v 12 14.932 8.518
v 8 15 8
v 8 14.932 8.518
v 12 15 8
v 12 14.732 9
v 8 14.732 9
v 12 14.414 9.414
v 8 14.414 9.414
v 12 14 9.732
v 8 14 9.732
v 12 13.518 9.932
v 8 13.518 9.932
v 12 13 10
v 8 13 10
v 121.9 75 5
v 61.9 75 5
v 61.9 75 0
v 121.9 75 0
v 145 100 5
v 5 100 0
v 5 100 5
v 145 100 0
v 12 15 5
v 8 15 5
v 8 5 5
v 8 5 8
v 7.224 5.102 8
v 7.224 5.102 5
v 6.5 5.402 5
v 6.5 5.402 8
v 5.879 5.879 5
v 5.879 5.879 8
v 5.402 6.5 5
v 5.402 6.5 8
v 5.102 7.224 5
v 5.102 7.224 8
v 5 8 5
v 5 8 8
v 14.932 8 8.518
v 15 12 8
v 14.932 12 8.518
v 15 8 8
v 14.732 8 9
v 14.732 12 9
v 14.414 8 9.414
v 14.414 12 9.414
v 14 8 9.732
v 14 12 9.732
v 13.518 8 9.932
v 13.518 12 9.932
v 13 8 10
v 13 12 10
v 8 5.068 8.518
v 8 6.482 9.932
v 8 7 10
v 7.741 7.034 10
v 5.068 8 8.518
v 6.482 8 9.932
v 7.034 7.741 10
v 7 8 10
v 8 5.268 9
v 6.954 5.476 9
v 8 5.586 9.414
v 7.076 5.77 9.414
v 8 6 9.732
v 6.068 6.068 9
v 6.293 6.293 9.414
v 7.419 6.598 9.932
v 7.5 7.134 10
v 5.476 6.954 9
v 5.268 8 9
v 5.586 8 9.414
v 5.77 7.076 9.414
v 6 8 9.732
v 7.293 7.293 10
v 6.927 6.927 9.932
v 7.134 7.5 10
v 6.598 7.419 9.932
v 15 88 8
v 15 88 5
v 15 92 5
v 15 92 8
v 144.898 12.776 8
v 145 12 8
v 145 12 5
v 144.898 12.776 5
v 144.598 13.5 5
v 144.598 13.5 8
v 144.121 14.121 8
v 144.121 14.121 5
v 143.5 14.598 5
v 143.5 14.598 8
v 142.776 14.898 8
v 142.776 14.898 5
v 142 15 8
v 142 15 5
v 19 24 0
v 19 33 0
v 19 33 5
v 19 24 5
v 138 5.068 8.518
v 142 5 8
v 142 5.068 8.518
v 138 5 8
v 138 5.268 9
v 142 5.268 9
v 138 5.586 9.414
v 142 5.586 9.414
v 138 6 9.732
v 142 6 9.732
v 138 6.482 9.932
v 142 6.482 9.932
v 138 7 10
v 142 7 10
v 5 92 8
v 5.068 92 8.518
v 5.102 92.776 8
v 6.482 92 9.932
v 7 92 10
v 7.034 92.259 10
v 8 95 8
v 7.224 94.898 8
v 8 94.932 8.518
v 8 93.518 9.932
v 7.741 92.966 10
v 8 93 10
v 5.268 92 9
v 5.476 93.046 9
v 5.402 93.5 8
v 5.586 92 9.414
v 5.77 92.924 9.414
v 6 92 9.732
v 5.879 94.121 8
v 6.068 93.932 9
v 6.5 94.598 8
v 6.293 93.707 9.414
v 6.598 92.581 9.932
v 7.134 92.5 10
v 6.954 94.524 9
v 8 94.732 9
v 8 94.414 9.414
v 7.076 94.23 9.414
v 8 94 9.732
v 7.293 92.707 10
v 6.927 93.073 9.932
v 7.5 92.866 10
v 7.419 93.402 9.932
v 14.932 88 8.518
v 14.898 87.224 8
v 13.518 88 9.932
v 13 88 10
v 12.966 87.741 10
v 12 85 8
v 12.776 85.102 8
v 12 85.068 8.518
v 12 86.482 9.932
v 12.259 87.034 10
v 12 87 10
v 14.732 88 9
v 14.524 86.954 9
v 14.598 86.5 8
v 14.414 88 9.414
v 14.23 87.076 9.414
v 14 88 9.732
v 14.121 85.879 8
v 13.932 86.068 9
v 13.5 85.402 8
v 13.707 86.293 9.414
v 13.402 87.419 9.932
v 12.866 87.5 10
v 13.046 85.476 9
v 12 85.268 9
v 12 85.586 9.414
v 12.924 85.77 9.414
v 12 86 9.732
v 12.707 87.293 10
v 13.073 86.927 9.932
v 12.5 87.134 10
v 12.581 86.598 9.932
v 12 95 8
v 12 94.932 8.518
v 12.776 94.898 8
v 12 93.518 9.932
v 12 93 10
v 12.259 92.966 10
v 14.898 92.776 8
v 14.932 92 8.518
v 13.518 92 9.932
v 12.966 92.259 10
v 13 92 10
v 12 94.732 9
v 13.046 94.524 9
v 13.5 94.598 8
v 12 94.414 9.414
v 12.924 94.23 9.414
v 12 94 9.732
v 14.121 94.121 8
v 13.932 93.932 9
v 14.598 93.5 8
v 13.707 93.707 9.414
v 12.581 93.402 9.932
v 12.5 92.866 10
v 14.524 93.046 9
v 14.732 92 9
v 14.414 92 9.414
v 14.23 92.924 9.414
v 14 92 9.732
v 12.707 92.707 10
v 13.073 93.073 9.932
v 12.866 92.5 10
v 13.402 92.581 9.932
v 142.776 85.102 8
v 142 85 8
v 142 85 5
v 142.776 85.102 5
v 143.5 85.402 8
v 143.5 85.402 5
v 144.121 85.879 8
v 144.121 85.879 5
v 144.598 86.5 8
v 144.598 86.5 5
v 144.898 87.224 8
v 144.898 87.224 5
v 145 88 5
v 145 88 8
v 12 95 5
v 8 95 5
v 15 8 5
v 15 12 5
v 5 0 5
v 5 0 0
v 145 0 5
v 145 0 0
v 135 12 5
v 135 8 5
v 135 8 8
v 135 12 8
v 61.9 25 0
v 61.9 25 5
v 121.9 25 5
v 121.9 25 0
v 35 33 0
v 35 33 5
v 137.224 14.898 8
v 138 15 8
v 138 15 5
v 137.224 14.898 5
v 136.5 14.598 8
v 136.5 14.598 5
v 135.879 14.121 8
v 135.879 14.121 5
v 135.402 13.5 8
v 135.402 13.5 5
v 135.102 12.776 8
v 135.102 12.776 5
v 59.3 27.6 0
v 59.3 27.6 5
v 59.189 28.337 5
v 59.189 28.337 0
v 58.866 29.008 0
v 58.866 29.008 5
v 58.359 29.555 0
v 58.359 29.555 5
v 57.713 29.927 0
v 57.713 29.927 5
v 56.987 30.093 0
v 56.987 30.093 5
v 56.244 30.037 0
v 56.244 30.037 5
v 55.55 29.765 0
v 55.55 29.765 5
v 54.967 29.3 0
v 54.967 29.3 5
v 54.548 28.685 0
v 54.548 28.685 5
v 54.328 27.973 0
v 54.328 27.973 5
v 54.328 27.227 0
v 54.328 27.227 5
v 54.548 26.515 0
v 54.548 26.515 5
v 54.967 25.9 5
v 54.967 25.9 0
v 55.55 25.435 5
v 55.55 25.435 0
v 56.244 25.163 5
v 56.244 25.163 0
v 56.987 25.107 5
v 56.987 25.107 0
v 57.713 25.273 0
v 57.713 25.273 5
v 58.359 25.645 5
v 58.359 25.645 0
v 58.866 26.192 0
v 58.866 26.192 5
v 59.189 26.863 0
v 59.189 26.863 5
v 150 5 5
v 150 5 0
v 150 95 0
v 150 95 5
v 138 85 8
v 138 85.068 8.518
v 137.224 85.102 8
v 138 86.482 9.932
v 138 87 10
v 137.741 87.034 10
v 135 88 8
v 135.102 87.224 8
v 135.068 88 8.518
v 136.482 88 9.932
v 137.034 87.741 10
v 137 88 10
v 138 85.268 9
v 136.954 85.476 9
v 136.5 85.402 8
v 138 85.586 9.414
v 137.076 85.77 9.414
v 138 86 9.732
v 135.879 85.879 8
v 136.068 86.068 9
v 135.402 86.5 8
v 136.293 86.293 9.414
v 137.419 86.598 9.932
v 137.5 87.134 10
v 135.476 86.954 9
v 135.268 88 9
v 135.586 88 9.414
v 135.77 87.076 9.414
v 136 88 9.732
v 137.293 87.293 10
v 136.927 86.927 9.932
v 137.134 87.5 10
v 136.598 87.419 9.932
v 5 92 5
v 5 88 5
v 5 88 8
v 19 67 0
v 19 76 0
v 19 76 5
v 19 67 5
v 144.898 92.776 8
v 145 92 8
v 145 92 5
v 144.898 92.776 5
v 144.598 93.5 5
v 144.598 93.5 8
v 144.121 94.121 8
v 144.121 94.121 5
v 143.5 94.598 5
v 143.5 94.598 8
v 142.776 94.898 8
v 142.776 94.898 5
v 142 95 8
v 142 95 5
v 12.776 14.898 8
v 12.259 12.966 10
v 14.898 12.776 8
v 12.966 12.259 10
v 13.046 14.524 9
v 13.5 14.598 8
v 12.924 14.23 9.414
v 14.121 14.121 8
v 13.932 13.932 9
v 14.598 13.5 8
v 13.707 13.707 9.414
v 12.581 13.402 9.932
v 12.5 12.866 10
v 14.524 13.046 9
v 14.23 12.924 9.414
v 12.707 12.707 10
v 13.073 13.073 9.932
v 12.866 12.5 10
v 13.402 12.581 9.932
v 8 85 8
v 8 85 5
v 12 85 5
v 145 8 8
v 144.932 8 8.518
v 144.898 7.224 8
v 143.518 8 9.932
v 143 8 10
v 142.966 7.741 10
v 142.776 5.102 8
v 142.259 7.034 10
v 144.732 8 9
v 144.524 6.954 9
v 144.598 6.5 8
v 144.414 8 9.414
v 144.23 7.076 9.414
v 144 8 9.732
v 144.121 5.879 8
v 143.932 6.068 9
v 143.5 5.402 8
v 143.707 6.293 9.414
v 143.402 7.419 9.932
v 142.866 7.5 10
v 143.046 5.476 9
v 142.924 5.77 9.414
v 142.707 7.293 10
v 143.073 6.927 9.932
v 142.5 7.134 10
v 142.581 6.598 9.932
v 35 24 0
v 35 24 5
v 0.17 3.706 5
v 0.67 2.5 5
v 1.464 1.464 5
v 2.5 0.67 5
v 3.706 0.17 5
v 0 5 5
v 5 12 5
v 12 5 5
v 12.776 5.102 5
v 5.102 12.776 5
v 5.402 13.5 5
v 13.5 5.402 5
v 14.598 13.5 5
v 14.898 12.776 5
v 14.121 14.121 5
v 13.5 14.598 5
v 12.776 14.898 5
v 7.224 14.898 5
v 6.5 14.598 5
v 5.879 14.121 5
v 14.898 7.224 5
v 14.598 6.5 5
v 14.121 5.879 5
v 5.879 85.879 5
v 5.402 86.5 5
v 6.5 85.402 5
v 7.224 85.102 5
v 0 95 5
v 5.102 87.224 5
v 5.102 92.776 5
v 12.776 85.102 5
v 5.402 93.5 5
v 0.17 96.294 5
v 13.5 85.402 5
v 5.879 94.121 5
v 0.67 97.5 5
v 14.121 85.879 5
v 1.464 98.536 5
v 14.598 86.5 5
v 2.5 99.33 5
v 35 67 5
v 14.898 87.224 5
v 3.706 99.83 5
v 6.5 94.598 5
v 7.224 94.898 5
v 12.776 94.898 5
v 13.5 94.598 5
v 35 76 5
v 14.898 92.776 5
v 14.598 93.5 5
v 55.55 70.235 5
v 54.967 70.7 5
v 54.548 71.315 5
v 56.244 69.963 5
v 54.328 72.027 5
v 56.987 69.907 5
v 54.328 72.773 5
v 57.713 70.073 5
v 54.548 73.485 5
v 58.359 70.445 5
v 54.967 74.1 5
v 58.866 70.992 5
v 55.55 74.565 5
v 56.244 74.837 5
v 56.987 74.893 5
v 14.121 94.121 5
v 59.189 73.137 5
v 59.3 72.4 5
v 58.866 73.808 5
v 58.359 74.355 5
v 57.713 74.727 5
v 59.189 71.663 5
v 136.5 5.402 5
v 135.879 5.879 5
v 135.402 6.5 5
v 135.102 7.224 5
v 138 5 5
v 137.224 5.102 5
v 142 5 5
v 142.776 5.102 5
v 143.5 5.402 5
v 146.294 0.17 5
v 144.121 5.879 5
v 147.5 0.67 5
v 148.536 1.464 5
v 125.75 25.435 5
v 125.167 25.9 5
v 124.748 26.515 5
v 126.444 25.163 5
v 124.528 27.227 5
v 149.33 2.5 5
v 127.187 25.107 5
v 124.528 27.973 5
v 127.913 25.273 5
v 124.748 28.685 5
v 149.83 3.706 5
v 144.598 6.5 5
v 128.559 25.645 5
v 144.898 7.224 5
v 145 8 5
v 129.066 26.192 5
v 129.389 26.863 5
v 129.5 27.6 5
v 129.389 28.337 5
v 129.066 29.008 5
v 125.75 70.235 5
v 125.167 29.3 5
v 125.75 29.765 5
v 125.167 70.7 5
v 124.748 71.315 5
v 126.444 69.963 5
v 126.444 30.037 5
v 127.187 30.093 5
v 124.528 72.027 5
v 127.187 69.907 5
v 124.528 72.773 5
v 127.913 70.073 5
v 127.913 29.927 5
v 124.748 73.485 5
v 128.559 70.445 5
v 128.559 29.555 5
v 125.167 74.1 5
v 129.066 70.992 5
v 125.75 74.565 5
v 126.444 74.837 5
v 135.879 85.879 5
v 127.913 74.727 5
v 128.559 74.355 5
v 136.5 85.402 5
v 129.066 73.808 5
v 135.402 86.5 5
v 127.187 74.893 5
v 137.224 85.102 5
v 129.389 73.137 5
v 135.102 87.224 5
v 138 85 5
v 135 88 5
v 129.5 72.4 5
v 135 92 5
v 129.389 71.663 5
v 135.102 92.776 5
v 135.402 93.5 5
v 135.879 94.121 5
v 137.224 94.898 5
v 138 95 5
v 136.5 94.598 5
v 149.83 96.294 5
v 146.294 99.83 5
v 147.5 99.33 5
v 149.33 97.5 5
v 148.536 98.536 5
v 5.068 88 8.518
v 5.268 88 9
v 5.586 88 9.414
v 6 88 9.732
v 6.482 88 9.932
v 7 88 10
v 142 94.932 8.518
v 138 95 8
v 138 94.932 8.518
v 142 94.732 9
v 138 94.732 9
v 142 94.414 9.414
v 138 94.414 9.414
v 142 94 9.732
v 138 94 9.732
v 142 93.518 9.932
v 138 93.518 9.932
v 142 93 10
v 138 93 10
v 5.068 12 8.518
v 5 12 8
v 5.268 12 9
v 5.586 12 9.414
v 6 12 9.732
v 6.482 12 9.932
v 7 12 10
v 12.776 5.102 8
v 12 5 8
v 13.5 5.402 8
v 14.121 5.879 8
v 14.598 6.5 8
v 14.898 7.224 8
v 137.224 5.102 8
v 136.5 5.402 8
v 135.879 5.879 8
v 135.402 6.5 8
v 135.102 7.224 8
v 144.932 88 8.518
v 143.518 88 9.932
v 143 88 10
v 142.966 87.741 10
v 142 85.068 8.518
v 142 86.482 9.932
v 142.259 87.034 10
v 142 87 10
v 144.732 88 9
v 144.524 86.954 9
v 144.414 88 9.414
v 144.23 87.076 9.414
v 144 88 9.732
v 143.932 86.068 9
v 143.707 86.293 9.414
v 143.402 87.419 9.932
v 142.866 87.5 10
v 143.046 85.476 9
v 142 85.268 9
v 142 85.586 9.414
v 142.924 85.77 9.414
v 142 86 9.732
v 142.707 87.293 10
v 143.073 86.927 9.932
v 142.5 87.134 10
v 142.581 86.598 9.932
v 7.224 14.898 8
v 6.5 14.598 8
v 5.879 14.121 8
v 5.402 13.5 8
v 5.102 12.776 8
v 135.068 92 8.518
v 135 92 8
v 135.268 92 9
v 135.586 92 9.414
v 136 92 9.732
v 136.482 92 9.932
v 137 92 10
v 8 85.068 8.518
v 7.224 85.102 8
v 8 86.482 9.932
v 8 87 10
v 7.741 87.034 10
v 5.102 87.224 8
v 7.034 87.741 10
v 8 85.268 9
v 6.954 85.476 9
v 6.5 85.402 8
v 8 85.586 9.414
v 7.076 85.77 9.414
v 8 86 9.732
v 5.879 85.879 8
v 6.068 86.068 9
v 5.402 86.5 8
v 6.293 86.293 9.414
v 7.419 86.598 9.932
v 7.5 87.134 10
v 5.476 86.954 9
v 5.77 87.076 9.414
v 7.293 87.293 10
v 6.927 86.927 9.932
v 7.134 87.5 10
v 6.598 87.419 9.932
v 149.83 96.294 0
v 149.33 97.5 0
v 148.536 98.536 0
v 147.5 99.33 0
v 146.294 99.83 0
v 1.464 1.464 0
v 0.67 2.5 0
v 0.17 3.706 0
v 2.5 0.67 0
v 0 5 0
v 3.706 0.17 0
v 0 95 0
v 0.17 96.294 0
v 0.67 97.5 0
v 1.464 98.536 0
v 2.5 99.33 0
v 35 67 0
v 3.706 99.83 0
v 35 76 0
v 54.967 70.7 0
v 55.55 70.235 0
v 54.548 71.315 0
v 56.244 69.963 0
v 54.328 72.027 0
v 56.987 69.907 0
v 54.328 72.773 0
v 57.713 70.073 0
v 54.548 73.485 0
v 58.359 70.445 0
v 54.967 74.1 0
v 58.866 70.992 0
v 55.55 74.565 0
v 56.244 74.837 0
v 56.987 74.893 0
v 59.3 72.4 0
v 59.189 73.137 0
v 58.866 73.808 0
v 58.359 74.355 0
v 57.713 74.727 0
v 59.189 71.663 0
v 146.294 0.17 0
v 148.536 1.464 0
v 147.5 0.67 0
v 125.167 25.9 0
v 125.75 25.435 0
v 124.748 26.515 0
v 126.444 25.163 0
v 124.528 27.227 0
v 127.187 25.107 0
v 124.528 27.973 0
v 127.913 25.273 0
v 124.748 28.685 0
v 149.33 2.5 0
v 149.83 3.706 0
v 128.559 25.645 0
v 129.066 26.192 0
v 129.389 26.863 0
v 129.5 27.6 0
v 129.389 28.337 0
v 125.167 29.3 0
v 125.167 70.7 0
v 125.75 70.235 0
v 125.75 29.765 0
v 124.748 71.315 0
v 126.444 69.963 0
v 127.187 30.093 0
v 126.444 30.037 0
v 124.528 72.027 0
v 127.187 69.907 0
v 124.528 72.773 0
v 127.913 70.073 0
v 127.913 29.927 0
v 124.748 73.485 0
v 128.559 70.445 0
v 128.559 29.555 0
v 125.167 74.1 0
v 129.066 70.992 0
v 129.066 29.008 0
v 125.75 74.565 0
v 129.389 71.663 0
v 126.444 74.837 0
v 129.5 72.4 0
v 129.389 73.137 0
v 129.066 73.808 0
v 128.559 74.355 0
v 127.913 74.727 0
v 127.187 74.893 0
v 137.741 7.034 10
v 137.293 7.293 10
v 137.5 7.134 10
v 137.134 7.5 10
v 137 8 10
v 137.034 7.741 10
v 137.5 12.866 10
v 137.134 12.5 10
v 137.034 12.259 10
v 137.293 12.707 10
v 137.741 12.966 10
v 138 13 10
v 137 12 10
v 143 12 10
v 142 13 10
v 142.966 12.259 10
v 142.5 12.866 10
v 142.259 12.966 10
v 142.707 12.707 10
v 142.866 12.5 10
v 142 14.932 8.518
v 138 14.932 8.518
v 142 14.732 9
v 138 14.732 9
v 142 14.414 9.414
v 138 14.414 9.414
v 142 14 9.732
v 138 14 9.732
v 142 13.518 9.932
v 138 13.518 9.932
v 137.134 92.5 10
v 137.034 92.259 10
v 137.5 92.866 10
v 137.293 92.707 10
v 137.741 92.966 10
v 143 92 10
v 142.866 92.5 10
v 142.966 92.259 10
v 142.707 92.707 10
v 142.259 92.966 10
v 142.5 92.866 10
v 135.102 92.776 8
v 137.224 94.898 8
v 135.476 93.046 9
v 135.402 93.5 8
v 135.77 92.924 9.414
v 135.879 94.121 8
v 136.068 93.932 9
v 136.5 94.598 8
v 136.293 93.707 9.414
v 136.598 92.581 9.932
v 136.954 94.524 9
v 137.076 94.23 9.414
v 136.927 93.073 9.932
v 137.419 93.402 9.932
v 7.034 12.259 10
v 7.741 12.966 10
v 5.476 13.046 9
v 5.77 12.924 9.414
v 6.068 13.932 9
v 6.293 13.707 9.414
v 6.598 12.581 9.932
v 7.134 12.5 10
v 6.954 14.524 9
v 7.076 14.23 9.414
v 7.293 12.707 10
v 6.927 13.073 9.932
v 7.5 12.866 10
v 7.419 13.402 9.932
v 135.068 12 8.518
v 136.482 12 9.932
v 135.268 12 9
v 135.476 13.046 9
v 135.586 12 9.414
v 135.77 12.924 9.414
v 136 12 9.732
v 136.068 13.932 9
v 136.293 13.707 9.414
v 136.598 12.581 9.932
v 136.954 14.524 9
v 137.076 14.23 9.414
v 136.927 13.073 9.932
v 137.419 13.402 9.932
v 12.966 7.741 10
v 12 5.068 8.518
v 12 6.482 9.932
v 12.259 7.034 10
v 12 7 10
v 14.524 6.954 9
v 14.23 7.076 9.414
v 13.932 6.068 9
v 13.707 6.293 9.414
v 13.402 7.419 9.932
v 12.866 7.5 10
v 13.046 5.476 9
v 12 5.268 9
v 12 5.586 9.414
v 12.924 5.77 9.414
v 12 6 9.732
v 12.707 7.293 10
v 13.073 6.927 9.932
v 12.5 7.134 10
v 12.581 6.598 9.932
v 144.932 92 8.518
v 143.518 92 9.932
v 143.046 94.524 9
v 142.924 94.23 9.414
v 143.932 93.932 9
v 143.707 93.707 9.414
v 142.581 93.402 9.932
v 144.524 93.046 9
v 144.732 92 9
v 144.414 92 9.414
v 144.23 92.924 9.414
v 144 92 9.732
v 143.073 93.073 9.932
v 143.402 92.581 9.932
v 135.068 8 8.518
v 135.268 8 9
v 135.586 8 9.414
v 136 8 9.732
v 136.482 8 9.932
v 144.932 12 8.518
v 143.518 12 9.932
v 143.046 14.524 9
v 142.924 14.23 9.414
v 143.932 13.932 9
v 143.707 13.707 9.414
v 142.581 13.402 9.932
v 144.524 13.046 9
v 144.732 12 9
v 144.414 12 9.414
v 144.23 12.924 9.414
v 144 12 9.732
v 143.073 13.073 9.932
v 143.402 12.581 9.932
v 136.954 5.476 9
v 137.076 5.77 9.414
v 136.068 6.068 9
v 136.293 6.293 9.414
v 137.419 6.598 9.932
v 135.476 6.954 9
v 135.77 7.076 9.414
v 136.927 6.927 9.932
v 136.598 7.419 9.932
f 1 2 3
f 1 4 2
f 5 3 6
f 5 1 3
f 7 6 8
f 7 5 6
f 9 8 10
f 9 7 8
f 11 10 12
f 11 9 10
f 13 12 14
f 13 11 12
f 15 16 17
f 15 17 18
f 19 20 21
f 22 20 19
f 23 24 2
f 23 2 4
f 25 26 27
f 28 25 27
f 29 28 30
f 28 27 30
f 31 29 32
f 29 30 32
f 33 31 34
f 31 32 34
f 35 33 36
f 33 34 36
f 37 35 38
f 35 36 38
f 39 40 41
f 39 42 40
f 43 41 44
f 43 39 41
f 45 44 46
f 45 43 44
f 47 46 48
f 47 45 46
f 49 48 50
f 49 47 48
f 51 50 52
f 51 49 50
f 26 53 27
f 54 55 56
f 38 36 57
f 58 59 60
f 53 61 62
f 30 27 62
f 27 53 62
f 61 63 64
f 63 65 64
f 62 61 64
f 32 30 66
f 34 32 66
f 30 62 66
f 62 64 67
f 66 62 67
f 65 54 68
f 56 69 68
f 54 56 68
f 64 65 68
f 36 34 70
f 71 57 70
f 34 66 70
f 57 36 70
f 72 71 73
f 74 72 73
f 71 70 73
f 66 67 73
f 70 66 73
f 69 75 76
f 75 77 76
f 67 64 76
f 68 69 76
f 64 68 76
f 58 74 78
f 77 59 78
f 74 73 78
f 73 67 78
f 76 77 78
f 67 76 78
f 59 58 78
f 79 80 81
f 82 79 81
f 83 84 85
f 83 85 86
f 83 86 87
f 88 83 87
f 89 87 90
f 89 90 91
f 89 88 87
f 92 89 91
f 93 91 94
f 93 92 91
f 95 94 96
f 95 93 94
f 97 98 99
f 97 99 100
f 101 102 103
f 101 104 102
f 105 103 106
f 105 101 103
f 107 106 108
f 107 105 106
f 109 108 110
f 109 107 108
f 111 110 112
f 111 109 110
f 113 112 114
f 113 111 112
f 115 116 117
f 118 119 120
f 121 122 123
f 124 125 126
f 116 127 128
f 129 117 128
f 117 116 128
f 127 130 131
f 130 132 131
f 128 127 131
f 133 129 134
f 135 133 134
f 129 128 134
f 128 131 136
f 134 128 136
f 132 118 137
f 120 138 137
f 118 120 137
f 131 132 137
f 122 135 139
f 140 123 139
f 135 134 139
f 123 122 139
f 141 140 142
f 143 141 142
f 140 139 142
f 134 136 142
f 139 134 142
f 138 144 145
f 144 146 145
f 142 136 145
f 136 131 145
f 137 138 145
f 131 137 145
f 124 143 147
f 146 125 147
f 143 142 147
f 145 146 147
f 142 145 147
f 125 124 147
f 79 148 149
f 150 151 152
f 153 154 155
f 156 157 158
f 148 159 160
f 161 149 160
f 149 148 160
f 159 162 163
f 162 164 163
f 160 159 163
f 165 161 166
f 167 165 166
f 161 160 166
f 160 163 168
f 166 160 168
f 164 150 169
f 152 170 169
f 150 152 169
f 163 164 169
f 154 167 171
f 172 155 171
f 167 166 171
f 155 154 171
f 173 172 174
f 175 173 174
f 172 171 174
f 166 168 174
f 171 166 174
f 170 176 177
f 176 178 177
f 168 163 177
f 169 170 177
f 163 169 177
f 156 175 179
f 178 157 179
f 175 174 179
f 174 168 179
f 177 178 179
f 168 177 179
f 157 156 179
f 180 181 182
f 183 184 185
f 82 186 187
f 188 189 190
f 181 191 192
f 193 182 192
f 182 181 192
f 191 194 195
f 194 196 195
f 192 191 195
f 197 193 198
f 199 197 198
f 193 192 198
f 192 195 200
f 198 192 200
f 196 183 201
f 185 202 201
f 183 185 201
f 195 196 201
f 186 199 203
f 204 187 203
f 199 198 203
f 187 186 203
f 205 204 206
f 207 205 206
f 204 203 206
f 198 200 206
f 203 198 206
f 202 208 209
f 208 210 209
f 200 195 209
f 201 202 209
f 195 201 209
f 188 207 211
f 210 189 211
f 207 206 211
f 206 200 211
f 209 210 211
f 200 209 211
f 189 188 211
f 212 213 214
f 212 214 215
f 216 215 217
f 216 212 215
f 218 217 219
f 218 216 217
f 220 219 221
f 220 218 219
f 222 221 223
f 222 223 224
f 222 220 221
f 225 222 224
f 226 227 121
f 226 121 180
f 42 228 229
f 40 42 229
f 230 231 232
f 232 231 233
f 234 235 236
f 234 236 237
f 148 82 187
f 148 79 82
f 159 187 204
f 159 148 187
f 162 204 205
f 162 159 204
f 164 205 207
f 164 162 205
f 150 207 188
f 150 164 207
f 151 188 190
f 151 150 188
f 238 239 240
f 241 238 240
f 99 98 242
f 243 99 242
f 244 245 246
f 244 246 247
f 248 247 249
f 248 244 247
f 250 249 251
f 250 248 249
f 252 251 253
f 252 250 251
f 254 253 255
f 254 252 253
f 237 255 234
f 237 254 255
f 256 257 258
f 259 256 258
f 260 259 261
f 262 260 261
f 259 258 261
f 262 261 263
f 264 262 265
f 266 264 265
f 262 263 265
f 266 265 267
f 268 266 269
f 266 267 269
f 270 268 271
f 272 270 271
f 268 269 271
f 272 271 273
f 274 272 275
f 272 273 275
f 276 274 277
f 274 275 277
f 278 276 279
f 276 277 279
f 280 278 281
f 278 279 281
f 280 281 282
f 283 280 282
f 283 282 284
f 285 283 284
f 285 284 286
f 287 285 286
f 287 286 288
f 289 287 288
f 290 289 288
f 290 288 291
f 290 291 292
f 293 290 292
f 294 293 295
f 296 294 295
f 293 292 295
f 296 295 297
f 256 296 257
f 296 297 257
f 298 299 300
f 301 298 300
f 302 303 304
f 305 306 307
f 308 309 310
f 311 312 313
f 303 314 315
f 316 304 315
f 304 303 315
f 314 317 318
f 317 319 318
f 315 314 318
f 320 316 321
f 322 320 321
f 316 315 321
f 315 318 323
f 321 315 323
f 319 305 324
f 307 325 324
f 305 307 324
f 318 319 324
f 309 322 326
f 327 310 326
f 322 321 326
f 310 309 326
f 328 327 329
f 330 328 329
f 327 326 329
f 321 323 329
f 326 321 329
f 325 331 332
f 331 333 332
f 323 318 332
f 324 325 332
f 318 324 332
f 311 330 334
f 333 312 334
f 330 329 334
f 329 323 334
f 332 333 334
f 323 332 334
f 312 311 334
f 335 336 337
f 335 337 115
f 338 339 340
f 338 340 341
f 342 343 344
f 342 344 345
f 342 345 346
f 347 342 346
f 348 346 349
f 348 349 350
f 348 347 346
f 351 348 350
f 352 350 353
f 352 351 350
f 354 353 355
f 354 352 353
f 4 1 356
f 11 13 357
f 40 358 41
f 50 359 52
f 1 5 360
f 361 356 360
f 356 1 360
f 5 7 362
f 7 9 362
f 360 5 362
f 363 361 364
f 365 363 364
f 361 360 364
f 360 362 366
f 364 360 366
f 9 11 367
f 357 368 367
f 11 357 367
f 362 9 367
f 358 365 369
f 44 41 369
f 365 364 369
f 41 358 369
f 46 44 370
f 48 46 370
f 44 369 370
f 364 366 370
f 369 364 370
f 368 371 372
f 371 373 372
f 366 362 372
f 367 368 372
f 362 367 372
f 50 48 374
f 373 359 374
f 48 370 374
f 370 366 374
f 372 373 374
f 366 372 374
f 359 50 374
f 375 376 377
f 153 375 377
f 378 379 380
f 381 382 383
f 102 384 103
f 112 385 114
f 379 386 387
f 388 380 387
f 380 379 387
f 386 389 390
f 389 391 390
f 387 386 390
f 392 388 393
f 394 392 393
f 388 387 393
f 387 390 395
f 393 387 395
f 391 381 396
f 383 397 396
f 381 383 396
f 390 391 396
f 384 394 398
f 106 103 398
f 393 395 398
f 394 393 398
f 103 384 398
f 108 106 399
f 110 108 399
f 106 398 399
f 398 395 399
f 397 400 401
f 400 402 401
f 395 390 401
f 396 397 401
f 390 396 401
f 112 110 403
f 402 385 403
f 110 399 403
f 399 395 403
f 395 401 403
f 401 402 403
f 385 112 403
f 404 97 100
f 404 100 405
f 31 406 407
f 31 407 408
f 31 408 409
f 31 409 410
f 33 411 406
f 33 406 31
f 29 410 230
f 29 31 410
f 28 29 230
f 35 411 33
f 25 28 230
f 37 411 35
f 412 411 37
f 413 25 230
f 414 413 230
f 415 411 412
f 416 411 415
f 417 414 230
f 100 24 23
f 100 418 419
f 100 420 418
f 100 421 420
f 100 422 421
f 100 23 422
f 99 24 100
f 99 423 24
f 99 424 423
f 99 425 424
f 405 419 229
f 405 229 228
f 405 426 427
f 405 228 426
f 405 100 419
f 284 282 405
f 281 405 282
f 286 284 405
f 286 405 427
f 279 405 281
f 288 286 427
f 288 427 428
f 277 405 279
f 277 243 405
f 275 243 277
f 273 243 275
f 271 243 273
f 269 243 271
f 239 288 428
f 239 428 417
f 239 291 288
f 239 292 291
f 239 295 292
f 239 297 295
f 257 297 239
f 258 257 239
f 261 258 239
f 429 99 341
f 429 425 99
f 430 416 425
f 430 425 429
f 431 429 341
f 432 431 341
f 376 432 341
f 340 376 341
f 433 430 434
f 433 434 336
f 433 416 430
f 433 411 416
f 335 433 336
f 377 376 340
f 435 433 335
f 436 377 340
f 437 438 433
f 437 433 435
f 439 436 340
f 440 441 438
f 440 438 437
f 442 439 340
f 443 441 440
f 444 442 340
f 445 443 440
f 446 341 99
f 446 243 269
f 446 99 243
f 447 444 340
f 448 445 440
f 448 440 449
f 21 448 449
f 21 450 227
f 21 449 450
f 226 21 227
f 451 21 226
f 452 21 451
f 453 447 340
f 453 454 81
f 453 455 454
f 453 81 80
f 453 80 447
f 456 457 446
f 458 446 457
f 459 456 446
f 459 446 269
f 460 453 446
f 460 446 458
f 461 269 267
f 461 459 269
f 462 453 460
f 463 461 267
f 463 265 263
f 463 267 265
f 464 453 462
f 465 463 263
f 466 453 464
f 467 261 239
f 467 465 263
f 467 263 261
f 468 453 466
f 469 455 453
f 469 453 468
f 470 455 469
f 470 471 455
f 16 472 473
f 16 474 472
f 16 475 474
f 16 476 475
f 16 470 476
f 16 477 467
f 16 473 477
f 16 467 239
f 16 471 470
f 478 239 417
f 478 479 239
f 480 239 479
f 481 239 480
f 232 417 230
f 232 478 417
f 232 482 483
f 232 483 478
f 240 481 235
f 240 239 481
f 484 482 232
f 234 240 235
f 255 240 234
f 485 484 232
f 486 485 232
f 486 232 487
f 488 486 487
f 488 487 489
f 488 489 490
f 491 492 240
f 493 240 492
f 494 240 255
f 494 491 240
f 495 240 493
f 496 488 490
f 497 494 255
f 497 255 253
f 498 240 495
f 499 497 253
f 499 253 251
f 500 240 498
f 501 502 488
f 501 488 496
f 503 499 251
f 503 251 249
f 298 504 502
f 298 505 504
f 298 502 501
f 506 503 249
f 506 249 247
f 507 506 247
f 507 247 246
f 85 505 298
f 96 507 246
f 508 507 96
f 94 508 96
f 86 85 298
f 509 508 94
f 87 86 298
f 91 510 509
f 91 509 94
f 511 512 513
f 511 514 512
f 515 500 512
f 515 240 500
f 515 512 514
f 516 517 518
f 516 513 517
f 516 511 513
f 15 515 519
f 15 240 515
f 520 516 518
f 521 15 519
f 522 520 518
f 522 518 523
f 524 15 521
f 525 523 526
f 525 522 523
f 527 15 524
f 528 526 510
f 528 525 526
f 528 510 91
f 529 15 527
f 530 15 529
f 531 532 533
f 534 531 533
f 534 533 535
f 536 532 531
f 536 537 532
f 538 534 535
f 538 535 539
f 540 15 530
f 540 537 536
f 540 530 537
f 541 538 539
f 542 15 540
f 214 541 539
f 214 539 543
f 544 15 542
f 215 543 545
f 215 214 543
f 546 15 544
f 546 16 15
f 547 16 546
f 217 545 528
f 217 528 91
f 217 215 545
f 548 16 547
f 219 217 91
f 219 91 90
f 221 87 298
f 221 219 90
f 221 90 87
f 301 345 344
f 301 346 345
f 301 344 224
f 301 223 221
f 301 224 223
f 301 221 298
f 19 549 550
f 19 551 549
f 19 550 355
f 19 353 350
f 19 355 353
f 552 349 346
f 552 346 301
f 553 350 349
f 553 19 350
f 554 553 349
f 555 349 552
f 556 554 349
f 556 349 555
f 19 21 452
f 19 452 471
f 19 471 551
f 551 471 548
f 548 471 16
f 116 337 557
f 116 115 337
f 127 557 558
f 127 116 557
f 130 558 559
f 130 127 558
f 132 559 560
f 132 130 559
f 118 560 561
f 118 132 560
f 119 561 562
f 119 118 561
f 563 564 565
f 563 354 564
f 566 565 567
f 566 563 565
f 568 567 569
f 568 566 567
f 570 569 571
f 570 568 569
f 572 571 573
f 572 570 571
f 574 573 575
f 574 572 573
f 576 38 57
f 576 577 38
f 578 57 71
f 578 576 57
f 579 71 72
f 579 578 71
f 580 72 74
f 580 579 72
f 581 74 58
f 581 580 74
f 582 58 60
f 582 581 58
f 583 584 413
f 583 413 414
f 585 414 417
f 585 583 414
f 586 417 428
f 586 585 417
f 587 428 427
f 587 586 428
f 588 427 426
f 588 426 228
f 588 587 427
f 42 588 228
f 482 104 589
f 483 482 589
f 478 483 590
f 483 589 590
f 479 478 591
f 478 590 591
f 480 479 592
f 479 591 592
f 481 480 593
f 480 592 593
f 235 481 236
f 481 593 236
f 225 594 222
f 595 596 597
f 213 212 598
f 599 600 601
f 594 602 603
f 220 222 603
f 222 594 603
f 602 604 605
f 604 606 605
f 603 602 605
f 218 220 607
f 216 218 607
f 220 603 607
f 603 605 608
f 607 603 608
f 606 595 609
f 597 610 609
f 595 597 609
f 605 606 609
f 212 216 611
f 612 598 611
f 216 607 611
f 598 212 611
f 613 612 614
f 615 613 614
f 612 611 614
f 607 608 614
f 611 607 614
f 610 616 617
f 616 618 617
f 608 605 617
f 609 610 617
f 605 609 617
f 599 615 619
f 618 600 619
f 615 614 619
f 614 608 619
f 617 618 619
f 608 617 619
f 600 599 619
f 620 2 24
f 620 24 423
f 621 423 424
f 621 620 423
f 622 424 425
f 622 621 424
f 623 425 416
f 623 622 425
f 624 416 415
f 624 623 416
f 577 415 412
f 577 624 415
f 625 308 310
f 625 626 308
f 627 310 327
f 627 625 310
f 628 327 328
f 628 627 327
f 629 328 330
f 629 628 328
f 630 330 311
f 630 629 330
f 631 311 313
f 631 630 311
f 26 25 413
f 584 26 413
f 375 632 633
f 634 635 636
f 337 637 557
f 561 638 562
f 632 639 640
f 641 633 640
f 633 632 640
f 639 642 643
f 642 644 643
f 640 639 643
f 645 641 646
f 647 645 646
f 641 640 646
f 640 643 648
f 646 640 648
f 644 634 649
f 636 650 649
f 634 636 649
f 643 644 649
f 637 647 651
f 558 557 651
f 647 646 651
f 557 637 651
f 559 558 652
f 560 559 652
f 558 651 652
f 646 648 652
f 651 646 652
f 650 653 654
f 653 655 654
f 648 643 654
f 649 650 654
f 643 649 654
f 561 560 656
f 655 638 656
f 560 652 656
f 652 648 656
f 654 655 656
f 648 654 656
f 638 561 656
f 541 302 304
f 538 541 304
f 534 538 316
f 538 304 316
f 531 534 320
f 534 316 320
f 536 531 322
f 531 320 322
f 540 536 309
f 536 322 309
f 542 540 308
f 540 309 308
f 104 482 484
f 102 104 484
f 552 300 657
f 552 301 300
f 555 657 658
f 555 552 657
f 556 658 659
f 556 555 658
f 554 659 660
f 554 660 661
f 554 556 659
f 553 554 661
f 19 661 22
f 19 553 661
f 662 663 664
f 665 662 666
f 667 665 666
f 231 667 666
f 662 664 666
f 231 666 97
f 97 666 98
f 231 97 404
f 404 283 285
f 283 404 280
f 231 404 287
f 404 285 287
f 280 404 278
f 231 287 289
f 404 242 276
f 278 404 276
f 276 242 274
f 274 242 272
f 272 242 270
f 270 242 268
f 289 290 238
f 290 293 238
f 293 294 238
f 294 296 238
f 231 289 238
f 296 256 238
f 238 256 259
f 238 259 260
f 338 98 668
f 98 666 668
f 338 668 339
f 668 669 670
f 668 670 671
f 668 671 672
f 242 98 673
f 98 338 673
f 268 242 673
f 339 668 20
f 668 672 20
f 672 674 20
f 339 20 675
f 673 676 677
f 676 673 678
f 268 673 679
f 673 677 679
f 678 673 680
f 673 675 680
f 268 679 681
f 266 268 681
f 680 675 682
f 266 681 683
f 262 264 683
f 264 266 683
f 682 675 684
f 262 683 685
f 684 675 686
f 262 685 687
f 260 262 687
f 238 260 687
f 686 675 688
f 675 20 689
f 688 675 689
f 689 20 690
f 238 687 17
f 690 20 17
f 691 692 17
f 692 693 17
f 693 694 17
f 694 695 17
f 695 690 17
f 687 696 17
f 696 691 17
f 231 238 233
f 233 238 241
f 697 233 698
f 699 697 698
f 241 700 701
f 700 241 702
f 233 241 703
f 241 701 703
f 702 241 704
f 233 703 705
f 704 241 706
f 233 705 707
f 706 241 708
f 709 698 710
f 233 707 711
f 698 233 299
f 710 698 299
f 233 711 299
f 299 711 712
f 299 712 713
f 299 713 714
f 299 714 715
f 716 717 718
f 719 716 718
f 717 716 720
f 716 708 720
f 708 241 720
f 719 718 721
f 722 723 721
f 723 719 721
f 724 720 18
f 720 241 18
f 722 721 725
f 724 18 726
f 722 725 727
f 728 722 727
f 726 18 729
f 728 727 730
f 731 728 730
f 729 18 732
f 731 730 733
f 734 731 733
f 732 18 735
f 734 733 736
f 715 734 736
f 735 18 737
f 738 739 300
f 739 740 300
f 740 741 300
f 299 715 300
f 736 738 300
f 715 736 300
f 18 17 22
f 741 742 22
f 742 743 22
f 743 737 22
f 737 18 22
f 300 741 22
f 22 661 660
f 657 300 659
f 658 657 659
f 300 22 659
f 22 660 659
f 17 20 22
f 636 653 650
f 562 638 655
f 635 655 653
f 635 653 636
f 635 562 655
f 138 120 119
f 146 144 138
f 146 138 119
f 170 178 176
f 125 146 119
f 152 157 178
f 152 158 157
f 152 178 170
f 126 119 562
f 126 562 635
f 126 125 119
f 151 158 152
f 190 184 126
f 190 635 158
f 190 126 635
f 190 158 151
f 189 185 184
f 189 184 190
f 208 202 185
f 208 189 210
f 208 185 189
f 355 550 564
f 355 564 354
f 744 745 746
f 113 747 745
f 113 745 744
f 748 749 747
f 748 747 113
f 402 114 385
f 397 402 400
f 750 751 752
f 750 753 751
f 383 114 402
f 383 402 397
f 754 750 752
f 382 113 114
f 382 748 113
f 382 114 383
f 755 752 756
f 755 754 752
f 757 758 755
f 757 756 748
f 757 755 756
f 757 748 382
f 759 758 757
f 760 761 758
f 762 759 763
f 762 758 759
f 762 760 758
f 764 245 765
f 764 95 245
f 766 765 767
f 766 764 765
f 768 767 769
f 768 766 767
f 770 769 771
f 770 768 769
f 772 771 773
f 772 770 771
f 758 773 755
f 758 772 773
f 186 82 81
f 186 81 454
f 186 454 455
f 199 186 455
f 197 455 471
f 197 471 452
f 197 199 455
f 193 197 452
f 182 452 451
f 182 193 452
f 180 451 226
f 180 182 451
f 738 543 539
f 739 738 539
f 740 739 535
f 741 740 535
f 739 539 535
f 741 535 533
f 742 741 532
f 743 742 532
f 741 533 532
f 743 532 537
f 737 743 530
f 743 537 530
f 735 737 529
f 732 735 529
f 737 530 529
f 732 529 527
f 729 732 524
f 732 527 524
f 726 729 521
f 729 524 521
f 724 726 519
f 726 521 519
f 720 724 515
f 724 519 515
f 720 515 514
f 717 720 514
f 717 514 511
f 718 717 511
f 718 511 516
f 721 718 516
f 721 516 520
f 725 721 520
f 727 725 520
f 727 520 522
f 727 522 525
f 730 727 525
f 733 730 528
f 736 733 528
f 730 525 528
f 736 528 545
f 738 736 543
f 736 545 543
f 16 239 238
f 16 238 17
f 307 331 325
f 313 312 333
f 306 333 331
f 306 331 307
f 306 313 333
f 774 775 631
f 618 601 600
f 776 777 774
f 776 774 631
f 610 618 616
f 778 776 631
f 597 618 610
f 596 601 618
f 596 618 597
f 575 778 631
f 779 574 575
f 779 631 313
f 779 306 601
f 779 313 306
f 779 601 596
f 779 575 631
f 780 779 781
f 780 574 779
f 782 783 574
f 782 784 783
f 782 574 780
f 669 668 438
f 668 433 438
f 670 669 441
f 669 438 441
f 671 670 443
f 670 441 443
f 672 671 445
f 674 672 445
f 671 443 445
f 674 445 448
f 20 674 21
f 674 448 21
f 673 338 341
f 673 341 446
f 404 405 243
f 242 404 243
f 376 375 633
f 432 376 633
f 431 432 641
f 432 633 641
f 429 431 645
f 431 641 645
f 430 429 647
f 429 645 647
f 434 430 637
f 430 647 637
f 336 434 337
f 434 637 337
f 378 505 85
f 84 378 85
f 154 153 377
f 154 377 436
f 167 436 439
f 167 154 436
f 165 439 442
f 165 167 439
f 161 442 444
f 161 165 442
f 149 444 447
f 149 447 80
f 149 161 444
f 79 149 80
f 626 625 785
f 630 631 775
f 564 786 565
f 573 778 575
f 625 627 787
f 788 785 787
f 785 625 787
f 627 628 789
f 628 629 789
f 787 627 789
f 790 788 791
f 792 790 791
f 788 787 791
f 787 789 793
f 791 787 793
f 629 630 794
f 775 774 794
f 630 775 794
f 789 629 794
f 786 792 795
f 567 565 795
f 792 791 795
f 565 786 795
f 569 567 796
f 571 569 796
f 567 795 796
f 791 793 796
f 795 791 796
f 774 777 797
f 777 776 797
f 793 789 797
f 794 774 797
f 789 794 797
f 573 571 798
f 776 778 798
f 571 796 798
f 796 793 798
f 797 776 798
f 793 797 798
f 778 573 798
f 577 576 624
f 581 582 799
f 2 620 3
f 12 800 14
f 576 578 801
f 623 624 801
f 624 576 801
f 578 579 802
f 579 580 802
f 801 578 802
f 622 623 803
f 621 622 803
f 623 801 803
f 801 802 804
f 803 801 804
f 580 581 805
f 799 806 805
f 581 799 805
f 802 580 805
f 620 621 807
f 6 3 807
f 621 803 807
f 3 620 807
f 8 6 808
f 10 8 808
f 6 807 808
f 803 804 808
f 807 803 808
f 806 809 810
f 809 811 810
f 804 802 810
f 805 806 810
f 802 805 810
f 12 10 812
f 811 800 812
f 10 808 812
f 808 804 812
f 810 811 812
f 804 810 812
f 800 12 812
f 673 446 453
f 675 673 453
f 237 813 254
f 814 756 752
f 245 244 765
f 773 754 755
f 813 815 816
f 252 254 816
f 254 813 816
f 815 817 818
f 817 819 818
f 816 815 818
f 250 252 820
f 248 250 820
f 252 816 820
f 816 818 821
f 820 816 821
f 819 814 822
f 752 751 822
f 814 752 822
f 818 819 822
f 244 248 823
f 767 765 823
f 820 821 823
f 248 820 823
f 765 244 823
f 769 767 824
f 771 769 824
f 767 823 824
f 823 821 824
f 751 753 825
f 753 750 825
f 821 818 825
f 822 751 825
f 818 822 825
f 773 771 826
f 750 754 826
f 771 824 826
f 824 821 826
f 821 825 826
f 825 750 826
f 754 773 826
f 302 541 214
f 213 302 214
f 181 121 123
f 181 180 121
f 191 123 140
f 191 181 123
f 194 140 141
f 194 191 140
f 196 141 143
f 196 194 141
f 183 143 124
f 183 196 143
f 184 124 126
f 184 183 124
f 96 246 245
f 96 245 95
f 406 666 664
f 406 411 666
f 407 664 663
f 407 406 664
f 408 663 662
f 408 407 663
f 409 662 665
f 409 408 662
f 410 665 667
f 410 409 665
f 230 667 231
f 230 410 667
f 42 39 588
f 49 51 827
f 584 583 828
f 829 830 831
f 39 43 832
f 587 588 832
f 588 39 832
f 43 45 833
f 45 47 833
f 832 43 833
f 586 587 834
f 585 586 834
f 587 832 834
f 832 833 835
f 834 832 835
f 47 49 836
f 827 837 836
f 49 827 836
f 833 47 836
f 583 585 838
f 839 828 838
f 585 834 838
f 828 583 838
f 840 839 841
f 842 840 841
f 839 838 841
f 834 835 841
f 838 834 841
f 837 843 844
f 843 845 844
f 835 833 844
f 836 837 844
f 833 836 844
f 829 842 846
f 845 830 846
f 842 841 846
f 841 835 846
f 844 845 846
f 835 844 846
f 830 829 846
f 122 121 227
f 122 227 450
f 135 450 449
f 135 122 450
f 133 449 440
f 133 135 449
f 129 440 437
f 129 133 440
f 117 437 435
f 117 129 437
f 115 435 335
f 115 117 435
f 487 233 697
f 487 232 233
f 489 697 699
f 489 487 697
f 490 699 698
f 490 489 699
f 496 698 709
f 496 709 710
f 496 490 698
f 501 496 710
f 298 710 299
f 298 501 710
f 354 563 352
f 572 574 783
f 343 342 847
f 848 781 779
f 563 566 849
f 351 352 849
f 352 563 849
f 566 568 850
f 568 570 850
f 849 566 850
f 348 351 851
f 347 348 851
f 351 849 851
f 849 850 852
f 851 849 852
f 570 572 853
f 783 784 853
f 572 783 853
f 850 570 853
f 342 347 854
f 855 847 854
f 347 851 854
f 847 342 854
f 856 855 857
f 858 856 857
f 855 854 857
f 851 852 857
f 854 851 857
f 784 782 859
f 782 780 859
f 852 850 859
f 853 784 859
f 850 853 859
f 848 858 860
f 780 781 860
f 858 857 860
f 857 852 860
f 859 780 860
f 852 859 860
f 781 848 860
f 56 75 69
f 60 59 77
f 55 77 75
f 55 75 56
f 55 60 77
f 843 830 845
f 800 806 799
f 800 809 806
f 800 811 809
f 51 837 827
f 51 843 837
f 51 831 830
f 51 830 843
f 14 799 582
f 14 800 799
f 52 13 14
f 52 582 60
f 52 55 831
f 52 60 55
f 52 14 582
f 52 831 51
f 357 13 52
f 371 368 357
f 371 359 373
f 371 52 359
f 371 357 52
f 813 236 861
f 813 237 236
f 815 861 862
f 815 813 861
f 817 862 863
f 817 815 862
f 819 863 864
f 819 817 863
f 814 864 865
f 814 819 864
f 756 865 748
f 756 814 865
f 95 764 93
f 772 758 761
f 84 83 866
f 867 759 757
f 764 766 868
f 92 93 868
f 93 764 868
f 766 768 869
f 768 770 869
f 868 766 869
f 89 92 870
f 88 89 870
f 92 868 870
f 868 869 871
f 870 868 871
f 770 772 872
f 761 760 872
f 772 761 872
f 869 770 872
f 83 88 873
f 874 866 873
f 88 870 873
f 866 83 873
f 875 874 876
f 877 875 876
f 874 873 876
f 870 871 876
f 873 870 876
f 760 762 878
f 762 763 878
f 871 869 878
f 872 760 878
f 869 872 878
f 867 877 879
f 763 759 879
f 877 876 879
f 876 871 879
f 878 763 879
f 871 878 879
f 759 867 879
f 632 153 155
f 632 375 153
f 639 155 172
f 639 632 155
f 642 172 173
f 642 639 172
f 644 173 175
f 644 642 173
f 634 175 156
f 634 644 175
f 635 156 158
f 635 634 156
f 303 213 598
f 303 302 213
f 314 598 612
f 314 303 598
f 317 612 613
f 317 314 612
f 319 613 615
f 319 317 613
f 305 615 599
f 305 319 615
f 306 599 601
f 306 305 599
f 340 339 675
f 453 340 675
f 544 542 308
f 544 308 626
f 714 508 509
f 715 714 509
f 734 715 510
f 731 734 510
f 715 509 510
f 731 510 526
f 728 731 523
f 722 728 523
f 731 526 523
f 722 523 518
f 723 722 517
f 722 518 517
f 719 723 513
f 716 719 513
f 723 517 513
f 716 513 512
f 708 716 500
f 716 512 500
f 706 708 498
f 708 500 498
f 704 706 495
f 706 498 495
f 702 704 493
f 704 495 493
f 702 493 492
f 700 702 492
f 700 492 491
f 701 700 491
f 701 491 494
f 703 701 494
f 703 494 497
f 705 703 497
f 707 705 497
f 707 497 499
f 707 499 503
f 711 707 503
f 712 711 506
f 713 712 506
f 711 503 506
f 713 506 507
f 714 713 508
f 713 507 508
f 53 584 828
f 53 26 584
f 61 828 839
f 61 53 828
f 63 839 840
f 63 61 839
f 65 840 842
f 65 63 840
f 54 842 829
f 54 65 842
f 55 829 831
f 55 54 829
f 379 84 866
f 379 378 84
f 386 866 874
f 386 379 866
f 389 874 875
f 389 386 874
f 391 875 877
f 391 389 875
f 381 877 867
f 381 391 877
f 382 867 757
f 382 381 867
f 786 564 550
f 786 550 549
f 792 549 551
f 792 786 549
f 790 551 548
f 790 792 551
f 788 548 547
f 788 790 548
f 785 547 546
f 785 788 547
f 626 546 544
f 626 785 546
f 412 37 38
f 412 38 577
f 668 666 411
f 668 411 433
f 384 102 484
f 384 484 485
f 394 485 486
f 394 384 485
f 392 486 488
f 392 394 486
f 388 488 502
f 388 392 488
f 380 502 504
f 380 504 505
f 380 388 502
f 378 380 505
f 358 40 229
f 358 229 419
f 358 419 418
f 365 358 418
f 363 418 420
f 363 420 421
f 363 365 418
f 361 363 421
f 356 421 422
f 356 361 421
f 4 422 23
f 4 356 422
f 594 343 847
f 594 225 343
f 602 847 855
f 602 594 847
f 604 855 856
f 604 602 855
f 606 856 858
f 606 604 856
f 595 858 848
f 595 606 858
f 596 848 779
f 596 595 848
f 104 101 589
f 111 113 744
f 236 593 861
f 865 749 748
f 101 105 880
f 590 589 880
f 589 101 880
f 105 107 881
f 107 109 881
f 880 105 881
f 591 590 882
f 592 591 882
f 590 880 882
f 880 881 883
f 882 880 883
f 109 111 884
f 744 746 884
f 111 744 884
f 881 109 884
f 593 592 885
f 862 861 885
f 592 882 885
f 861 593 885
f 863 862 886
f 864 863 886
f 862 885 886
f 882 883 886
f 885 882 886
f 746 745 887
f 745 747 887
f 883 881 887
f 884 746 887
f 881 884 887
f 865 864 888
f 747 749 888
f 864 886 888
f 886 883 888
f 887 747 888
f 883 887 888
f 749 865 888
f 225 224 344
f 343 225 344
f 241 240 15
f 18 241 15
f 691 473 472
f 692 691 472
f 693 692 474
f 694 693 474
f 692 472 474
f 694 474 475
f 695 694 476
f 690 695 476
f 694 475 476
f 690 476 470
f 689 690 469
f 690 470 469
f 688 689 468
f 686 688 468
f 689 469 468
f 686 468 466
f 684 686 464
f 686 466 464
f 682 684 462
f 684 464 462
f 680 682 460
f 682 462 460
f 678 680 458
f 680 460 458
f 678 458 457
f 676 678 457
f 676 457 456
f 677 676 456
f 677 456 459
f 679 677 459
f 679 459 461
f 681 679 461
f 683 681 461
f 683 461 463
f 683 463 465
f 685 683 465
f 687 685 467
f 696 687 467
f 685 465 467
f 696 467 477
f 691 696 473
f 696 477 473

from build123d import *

# Parameters (mm, degrees)
SKETCH_W        = 150
SKETCH_H        = 100
PAD_DEPTH       = 5
FILLET_R        = 5
SKETCH001_W     = 10
SKETCH001_H     = 10
PAD001_DEPTH    = 5
FILLET001_R     = 3
FILLET002_R     = 2
SKETCH002_R     = 2.5
POCKET_DEPTH    = 5
SKETCH003_W     = 60
SKETCH003_H     = 50
POCKET001_DEPTH = 5.001
SKETCH004_W     = 14
SKETCH004_H     = 7
POCKET002_DEPTH = 5.001
SKETCH005_W     = 16
SKETCH005_H     = 7
POCKET003_DEPTH = 2
SKETCH006_W     = 16
SKETCH006_H     = 9
POCKET004_DEPTH = 10.001


with BuildPart() as part:
    # Sketch → Pad (new body)
    with BuildSketch(Plane.XY):
        with Locations((75, 50)):
            Rectangle(SKETCH_W, SKETCH_H)
    extrude(amount=PAD_DEPTH)

    # Fillet
    fillet_edges = [part.edges().sort_by_distance(p)[0] for p in [
        (0, 0, 2.5),
        (150, 0, 2.5),
        (150, 100, 2.5),
        (0, 100, 2.5),
    ]]
    fillet(fillet_edges, radius=FILLET_R)

    # Sketch001 → Pad001 (new body)
    with BuildSketch(Plane.XY.offset(5)):
        with Locations((10, 10)):
            Rectangle(SKETCH001_W, SKETCH001_H)
        with Locations((140, 90)):
            Rectangle(SKETCH001_W, SKETCH001_H)
        with Locations((10, 90)):
            Rectangle(SKETCH001_W, SKETCH001_H)
        with Locations((140, 10)):
            Rectangle(SKETCH001_W, SKETCH001_H)
    extrude(amount=PAD001_DEPTH)

    # Fillet001
    fillet001_edges = [part.edges().sort_by_distance(p)[0] for p in [
        (5, 5, 7.5),
        (15, 5, 7.5),
        (5, 15, 7.5),
        (15, 15, 7.5),
        (5, 95, 7.5),
        (15, 95, 7.5),
        (5, 85, 7.5),
        (15, 85, 7.5),
        (135, 5, 7.5),
        (145, 5, 7.5),
        (145, 15, 7.5),
        (135, 85, 7.5),
        (145, 85, 7.5),
        (145, 95, 7.5),
        (135, 95, 7.5),
        (135, 15, 7.5),
    ]]
    fillet(fillet001_edges, radius=FILLET001_R)

    # Fillet002
    fillet002_edges = [part.edges().sort_by_distance(p)[0] for p in [
        (10, 15, 10),
        (140, 15, 10),
        (140, 95, 10),
        (10, 95, 10),
    ]]
    fillet(fillet002_edges, radius=FILLET002_R)

    # Sketch002 → Pocket (cut)
    with BuildSketch(Plane.XY.offset(5)):
        with Locations((56.8, 72.4)):
            Circle(SKETCH002_R)
        with Locations((127, 72.4)):
            Circle(SKETCH002_R)
        with Locations((56.8, 27.6)):
            Circle(SKETCH002_R)
        with Locations((127, 27.6)):
            Circle(SKETCH002_R)
    extrude(amount=-POCKET_DEPTH, mode=Mode.SUBTRACT)

    # Sketch003 → Pocket001 (cut, through all)
    with BuildSketch(Plane.XY.offset(5)):
        with Locations((91.9, 50)):
            Rectangle(SKETCH003_W, SKETCH003_H)
    extrude(amount=-POCKET001_DEPTH, mode=Mode.SUBTRACT)

    # Sketch004 → Pocket002 (cut, through all)
    with BuildSketch(Plane.XY.offset(5)):
        with Locations((27, 71.5)):
            Rectangle(SKETCH004_W, SKETCH004_H)
        with Locations((27, 28.5)):
            Rectangle(SKETCH004_W, SKETCH004_H)
    extrude(amount=-POCKET002_DEPTH, mode=Mode.SUBTRACT)

    # Sketch005 → Pocket003 (cut)
    with BuildSketch(Plane.XY.offset(5)):
        with Locations((27, 71.5)):
            Rectangle(SKETCH005_W, SKETCH005_H)
        with Locations((27, 28.5)):
            Rectangle(SKETCH005_W, SKETCH005_H)
    extrude(amount=-POCKET003_DEPTH, mode=Mode.SUBTRACT)

    # Sketch006 → Pocket004 (cut, through all)
    with BuildSketch(Plane(origin=(0, 0, 0), x_dir=(1, 0, 0), z_dir=(0, 0, -1))):
        with Locations((27, -28.5)):
            Rectangle(SKETCH006_W, SKETCH006_H)
        with Locations((27, -71.5)):
            Rectangle(SKETCH006_W, SKETCH006_H)
    extrude(amount=-POCKET004_DEPTH, mode=Mode.SUBTRACT)


solid = part.part
